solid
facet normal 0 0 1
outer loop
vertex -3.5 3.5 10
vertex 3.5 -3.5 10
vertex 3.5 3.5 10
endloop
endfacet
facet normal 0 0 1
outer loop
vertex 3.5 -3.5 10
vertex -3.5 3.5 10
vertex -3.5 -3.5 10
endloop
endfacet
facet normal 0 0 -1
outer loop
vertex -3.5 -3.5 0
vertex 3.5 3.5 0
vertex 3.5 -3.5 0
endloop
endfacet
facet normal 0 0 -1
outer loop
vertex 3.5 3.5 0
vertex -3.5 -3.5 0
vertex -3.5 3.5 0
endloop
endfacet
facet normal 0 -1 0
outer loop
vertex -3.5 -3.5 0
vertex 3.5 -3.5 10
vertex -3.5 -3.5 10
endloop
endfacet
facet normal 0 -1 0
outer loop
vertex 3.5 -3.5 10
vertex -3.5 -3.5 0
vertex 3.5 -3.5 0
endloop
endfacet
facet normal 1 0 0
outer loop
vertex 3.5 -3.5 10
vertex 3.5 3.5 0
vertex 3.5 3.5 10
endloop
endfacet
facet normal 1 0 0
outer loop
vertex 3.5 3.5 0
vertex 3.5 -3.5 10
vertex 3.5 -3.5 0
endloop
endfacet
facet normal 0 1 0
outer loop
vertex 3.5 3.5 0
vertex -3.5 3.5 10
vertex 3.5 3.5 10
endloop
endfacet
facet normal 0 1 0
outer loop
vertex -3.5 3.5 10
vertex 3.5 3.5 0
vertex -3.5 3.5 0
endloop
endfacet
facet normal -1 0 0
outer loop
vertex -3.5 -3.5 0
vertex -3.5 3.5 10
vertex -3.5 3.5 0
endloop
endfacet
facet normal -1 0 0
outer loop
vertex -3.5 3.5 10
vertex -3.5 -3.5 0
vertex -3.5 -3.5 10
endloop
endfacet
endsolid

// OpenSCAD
translate([0, 0, 5]) color([0,1,0,0.9]) cube([7, 7, 10], center=true);
